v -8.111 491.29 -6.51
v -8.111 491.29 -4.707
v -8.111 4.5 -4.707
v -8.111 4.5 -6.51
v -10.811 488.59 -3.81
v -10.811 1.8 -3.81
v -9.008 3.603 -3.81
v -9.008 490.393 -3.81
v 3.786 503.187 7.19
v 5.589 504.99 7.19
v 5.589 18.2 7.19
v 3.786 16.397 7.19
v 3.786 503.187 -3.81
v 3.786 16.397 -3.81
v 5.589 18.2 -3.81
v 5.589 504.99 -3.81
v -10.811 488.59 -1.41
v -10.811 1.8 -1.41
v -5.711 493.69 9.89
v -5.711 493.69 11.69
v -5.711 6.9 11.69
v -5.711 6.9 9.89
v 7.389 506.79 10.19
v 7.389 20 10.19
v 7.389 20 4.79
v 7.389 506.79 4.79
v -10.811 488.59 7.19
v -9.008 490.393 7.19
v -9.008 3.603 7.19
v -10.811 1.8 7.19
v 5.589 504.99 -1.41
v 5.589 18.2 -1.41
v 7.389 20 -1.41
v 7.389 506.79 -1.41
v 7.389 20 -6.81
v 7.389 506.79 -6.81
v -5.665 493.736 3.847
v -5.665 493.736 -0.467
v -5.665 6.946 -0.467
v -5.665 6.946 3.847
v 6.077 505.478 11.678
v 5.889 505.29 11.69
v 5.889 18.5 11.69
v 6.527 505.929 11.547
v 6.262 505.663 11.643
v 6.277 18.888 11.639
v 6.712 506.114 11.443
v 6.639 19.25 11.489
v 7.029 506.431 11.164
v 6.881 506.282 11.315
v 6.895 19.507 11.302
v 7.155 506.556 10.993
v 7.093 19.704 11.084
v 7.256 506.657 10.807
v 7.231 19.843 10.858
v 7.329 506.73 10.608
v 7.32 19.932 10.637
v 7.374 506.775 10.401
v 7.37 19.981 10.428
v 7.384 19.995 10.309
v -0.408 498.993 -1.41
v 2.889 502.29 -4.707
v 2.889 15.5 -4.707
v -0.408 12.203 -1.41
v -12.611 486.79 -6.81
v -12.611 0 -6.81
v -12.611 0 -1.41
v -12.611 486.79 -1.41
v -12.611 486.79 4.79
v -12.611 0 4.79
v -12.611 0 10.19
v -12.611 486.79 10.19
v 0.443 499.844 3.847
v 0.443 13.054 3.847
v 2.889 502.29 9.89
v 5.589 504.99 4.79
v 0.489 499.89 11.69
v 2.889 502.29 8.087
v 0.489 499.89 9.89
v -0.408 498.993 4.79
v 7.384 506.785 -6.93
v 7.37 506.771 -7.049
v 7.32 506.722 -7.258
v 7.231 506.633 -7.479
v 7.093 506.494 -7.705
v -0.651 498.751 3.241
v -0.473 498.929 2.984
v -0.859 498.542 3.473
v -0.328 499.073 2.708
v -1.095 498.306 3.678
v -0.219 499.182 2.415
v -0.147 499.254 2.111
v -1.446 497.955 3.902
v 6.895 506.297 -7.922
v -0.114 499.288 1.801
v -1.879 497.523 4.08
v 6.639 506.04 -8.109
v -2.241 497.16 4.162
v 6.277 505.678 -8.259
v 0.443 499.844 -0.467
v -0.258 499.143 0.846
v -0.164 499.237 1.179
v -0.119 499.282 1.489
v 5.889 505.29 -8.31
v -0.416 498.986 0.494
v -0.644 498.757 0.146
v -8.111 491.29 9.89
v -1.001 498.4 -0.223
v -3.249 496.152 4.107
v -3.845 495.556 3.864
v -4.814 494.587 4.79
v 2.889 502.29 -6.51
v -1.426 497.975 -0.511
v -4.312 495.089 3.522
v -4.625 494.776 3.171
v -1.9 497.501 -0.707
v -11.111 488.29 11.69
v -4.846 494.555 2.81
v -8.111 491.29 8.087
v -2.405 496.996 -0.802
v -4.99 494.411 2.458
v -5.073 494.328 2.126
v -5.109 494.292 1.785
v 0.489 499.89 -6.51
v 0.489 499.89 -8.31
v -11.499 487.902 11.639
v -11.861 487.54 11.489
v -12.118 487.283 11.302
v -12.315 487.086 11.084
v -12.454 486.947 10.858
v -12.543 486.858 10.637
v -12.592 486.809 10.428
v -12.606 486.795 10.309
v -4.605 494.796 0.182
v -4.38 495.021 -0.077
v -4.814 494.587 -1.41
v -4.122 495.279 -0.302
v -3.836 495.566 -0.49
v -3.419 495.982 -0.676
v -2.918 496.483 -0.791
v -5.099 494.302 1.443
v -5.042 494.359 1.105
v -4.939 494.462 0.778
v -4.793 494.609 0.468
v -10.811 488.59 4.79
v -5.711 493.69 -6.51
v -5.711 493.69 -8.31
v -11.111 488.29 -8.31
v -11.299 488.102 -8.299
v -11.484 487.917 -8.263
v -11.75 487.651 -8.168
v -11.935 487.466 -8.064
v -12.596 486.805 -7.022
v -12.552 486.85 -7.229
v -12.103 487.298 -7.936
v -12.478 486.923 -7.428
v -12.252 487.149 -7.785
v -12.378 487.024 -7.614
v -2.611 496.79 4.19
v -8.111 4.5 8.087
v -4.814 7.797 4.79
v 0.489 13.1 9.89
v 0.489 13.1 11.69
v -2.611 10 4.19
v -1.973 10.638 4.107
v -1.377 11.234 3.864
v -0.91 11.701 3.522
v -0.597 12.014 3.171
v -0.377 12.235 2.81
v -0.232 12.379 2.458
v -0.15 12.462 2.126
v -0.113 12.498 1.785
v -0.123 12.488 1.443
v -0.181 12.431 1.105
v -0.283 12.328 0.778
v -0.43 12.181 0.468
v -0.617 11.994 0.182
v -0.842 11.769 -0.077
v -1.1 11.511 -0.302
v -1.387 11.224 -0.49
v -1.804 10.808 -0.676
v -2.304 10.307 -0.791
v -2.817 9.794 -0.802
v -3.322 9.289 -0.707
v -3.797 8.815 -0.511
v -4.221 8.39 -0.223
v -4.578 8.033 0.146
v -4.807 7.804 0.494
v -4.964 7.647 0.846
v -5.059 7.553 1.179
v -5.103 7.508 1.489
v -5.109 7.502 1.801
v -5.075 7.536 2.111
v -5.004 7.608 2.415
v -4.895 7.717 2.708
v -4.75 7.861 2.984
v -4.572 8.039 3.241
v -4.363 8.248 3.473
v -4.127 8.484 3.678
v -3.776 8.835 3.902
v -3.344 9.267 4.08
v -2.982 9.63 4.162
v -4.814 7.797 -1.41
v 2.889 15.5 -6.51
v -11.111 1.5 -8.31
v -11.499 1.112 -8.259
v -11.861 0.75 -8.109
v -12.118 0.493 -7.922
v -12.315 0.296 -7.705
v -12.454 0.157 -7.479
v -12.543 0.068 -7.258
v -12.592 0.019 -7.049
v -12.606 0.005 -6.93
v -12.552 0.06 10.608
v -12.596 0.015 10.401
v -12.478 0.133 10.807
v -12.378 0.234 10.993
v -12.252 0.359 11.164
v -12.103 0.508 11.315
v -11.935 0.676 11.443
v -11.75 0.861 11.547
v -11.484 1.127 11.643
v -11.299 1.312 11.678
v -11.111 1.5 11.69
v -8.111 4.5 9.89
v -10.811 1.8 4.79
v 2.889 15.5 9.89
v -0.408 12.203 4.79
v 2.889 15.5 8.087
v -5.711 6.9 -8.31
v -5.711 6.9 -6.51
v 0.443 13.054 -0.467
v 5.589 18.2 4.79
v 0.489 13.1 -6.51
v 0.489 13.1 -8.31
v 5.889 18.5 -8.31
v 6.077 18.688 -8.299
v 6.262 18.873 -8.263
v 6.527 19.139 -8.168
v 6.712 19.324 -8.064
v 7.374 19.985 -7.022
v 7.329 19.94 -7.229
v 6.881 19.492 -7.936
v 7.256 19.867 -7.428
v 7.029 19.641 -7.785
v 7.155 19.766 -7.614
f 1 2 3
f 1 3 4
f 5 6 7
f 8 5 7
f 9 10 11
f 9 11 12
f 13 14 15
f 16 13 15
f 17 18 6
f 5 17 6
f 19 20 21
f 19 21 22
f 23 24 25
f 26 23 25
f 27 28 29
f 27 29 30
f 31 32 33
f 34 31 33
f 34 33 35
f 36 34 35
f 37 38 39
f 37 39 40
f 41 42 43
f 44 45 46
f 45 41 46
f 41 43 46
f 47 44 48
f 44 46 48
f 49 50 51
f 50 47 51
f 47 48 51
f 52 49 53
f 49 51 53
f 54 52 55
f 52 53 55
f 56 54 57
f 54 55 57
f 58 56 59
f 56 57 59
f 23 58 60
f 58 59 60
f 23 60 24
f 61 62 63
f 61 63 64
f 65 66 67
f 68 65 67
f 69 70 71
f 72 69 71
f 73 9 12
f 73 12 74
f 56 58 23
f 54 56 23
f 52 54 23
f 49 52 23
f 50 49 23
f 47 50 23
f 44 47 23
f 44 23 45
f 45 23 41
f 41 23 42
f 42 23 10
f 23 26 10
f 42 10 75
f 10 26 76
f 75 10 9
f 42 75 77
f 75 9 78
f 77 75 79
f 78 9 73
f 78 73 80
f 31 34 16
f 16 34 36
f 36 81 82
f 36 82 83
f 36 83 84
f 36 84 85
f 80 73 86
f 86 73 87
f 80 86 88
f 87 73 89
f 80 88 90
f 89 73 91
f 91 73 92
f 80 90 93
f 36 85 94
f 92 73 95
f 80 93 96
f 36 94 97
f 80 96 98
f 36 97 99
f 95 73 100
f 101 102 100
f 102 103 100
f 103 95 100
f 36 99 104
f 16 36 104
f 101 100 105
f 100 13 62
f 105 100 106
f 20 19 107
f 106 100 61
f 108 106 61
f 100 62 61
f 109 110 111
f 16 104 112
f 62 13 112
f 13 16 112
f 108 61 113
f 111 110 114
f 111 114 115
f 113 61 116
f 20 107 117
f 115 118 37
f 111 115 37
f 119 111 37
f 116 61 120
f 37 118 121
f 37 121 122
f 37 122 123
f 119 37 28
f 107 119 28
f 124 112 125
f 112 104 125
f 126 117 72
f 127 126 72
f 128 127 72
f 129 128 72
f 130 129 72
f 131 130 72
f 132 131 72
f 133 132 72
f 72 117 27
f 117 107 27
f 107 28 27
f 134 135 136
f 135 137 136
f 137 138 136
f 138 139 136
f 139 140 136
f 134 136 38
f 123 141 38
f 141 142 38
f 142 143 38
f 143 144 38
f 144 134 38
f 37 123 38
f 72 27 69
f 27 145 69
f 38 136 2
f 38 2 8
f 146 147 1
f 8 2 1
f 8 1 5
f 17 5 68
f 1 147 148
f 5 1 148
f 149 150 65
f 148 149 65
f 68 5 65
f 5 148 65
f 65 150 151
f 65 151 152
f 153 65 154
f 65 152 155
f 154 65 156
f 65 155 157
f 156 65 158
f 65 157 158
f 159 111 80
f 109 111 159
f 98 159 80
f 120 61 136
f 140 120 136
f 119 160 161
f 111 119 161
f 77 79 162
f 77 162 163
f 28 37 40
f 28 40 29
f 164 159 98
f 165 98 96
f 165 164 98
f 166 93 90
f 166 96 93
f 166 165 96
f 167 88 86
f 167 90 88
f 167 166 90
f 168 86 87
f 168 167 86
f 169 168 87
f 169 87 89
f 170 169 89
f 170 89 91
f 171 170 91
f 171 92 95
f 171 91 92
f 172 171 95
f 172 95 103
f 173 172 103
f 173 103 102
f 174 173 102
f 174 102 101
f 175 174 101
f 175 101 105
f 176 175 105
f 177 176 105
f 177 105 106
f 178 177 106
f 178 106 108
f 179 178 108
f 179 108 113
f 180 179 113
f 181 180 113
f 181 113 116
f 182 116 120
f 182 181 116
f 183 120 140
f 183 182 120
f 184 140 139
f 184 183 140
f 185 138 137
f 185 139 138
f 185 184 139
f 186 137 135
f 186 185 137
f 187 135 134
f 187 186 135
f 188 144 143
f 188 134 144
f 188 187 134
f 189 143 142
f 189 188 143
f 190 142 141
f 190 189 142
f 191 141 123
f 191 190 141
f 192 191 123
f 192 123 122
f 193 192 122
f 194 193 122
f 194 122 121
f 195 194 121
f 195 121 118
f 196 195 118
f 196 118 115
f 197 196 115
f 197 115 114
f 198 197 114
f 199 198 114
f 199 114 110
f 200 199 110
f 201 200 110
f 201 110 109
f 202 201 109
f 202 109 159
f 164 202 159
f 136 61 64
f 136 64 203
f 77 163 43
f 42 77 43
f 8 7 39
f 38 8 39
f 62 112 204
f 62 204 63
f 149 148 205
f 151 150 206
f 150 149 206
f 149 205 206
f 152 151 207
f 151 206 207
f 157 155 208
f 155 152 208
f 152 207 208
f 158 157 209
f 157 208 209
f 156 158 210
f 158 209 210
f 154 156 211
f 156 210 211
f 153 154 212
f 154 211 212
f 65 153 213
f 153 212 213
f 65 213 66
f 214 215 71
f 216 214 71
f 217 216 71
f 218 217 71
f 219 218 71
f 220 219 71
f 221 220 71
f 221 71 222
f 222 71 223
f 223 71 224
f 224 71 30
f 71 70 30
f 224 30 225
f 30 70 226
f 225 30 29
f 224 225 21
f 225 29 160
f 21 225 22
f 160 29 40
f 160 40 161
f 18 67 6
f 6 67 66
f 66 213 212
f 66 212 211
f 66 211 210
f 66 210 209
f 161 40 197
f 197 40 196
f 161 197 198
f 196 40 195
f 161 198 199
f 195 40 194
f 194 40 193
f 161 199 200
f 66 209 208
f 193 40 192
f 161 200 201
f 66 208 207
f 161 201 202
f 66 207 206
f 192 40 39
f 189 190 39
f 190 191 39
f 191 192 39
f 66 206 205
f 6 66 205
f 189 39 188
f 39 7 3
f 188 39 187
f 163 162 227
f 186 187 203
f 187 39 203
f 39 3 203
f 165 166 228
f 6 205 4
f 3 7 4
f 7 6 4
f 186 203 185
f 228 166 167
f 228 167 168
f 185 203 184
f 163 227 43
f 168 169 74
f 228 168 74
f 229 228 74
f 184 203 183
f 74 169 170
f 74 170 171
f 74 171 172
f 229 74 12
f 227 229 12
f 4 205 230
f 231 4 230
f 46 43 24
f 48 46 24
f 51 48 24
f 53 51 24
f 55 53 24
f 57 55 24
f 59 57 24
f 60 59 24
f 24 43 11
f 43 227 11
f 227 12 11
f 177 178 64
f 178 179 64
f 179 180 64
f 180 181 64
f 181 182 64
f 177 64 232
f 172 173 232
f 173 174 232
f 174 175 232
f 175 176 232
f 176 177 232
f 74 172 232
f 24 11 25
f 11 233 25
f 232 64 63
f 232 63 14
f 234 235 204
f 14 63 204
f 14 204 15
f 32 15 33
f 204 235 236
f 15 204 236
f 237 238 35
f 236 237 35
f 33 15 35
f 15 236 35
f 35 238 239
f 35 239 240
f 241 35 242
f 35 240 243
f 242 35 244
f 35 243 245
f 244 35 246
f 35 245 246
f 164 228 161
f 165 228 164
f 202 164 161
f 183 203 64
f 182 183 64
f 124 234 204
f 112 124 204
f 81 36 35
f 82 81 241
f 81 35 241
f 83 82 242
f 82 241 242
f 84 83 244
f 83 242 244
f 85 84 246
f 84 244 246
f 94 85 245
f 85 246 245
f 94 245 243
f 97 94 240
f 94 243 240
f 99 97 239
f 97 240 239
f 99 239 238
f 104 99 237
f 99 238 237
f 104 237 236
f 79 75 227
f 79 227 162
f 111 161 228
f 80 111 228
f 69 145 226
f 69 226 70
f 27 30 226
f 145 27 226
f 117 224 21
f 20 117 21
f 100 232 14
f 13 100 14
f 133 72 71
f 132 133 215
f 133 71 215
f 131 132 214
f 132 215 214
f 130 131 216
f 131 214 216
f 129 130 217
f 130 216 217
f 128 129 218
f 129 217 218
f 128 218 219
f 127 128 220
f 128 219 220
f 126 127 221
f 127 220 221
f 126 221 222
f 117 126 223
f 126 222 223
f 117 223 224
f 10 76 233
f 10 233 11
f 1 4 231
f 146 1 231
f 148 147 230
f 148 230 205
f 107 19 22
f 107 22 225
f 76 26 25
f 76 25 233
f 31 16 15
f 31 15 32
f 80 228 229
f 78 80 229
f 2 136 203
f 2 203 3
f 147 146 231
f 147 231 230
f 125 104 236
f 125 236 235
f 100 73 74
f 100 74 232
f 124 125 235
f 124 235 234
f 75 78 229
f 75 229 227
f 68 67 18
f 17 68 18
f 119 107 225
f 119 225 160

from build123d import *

# Parameters (mm, degrees)
SKETCH_1_R          = 2.5
EXTRUDE_1_DEPTH     = 506.79
CUT_EXTRUDE_1_DEPTH = 508.341254196


with BuildPart() as part:
    # 草图1 → 凸台-拉伸1 (new body)
    with BuildSketch(Plane(origin=(0, 0, 0), x_dir=(1, 0, 0), z_dir=(0, 1, 0))):
        with BuildLine():
            Line((-10.811269129, -4.789644731), (-12.611269129, -4.789644731))
            Line((-12.611269129, -4.789644731), (-12.611269129, -10.189644731))
            ThreePointArc((-12.611269129, -10.189644731), (-12.171929301, -11.250304902), (-11.111269129, -11.689644731))
            Line((-11.111269129, -11.689644731), (-5.711269129, -11.689644731))
            Line((-5.711269129, -11.689644731), (-5.711269129, -9.889644731))
            Line((-5.711269129, -9.889644731), (-8.111269129, -9.889644731))
            Line((-8.111269129, -9.889644731), (-8.111269129, -8.086694886))
            Line((-8.111269129, -8.086694886), (-4.814218974, -4.789644731))
            Line((-4.814218974, -4.789644731), (-0.408319284, -4.789644731))
            Line((-0.408319284, -4.789644731), (2.888730871, -8.086694886))
            Line((2.888730871, -8.086694886), (2.888730871, -9.889644731))
            Line((2.888730871, -9.889644731), (0.488730871, -9.889644731))
            Line((0.488730871, -9.889644731), (0.488730871, -11.689644731))
            Line((0.488730871, -11.689644731), (5.888730871, -11.689644731))
            ThreePointArc((5.888730871, -11.689644731), (6.949391043, -11.250304902), (7.388730871, -10.189644731))
            Line((7.388730871, -10.189644731), (7.388730871, -4.789644731))
            Line((7.388730871, -4.789644731), (5.588730871, -4.789644731))
            Line((5.588730871, -4.789644731), (5.588730871, -7.189644731))
            Line((5.588730871, -7.189644731), (3.785781026, -7.189644731))
            Line((3.785781026, -7.189644731), (0.442857891, -3.846721596))
            Line((0.442857891, -3.846721596), (0.442857891, 0.467432135))
            Line((0.442857891, 0.467432135), (3.785781026, 3.810355269))
            Line((3.785781026, 3.810355269), (5.588730871, 3.810355269))
            Line((5.588730871, 3.810355269), (5.588730871, 1.410355269))
            Line((5.588730871, 1.410355269), (7.388730871, 1.410355269))
            Line((7.388730871, 1.410355269), (7.388730871, 6.810355269))
            ThreePointArc((7.388730871, 6.810355269), (6.949391043, 7.871015441), (5.888730871, 8.310355269))
            Line((5.888730871, 8.310355269), (0.488730871, 8.310355269))
            Line((0.488730871, 8.310355269), (0.488730871, 6.510355269))
            Line((0.488730871, 6.510355269), (2.888730871, 6.510355269))
            Line((2.888730871, 6.510355269), (2.888730871, 4.707405425))
            Line((2.888730871, 4.707405425), (-0.408319284, 1.410355269))
            Line((-0.408319284, 1.410355269), (-4.814218974, 1.410355269))
            Line((-4.814218974, 1.410355269), (-8.111269129, 4.707405425))
            Line((-8.111269129, 4.707405425), (-8.111269129, 6.510355269))
            Line((-8.111269129, 6.510355269), (-5.711269129, 6.510355269))
            Line((-5.711269129, 6.510355269), (-5.711269129, 8.310355269))
            Line((-5.711269129, 8.310355269), (-11.111269129, 8.310355269))
            ThreePointArc((-11.111269129, 8.310355269), (-12.171929301, 7.871015441), (-12.611269129, 6.810355269))
            Line((-12.611269129, 6.810355269), (-12.611269129, 1.410355269))
            Line((-12.611269129, 1.410355269), (-10.811269129, 1.410355269))
            Line((-10.811269129, 1.410355269), (-10.811269129, 3.810355269))
            Line((-10.811269129, 3.810355269), (-9.008319284, 3.810355269))
            Line((-9.008319284, 3.810355269), (-5.665396149, 0.467432135))
            Line((-5.665396149, 0.467432135), (-5.665396149, -3.846721596))
            Line((-5.665396149, -3.846721596), (-9.008319284, -7.189644731))
            Line((-9.008319284, -7.189644731), (-10.811269129, -7.189644731))
            Line((-10.811269129, -7.189644731), (-10.811269129, -4.789644731))
        make_face()
        with Locations(Location((-2.611269129, -1.689644731, 0), (0, 0, 270))):
            Circle(SKETCH_1_R, mode=Mode.SUBTRACT)
    extrude(amount=EXTRUDE_1_DEPTH)

    # 草图2 → 切除-拉伸1 (cut, through all)
    with BuildSketch(Plane(origin=(0, 0, -8.310355269), x_dir=(-1, 0, 0), z_dir=(0, 0, -1))):
        Polygon((-7.388730871, 506.79), (12.611269129, 486.79), (12.611269129, 506.79), align=None)
        Polygon((12.611269129, 0), (-7.388730871, 20), (-7.388730871, 0), align=None)
    extrude(amount=-CUT_EXTRUDE_1_DEPTH, mode=Mode.SUBTRACT)


solid = part.part
